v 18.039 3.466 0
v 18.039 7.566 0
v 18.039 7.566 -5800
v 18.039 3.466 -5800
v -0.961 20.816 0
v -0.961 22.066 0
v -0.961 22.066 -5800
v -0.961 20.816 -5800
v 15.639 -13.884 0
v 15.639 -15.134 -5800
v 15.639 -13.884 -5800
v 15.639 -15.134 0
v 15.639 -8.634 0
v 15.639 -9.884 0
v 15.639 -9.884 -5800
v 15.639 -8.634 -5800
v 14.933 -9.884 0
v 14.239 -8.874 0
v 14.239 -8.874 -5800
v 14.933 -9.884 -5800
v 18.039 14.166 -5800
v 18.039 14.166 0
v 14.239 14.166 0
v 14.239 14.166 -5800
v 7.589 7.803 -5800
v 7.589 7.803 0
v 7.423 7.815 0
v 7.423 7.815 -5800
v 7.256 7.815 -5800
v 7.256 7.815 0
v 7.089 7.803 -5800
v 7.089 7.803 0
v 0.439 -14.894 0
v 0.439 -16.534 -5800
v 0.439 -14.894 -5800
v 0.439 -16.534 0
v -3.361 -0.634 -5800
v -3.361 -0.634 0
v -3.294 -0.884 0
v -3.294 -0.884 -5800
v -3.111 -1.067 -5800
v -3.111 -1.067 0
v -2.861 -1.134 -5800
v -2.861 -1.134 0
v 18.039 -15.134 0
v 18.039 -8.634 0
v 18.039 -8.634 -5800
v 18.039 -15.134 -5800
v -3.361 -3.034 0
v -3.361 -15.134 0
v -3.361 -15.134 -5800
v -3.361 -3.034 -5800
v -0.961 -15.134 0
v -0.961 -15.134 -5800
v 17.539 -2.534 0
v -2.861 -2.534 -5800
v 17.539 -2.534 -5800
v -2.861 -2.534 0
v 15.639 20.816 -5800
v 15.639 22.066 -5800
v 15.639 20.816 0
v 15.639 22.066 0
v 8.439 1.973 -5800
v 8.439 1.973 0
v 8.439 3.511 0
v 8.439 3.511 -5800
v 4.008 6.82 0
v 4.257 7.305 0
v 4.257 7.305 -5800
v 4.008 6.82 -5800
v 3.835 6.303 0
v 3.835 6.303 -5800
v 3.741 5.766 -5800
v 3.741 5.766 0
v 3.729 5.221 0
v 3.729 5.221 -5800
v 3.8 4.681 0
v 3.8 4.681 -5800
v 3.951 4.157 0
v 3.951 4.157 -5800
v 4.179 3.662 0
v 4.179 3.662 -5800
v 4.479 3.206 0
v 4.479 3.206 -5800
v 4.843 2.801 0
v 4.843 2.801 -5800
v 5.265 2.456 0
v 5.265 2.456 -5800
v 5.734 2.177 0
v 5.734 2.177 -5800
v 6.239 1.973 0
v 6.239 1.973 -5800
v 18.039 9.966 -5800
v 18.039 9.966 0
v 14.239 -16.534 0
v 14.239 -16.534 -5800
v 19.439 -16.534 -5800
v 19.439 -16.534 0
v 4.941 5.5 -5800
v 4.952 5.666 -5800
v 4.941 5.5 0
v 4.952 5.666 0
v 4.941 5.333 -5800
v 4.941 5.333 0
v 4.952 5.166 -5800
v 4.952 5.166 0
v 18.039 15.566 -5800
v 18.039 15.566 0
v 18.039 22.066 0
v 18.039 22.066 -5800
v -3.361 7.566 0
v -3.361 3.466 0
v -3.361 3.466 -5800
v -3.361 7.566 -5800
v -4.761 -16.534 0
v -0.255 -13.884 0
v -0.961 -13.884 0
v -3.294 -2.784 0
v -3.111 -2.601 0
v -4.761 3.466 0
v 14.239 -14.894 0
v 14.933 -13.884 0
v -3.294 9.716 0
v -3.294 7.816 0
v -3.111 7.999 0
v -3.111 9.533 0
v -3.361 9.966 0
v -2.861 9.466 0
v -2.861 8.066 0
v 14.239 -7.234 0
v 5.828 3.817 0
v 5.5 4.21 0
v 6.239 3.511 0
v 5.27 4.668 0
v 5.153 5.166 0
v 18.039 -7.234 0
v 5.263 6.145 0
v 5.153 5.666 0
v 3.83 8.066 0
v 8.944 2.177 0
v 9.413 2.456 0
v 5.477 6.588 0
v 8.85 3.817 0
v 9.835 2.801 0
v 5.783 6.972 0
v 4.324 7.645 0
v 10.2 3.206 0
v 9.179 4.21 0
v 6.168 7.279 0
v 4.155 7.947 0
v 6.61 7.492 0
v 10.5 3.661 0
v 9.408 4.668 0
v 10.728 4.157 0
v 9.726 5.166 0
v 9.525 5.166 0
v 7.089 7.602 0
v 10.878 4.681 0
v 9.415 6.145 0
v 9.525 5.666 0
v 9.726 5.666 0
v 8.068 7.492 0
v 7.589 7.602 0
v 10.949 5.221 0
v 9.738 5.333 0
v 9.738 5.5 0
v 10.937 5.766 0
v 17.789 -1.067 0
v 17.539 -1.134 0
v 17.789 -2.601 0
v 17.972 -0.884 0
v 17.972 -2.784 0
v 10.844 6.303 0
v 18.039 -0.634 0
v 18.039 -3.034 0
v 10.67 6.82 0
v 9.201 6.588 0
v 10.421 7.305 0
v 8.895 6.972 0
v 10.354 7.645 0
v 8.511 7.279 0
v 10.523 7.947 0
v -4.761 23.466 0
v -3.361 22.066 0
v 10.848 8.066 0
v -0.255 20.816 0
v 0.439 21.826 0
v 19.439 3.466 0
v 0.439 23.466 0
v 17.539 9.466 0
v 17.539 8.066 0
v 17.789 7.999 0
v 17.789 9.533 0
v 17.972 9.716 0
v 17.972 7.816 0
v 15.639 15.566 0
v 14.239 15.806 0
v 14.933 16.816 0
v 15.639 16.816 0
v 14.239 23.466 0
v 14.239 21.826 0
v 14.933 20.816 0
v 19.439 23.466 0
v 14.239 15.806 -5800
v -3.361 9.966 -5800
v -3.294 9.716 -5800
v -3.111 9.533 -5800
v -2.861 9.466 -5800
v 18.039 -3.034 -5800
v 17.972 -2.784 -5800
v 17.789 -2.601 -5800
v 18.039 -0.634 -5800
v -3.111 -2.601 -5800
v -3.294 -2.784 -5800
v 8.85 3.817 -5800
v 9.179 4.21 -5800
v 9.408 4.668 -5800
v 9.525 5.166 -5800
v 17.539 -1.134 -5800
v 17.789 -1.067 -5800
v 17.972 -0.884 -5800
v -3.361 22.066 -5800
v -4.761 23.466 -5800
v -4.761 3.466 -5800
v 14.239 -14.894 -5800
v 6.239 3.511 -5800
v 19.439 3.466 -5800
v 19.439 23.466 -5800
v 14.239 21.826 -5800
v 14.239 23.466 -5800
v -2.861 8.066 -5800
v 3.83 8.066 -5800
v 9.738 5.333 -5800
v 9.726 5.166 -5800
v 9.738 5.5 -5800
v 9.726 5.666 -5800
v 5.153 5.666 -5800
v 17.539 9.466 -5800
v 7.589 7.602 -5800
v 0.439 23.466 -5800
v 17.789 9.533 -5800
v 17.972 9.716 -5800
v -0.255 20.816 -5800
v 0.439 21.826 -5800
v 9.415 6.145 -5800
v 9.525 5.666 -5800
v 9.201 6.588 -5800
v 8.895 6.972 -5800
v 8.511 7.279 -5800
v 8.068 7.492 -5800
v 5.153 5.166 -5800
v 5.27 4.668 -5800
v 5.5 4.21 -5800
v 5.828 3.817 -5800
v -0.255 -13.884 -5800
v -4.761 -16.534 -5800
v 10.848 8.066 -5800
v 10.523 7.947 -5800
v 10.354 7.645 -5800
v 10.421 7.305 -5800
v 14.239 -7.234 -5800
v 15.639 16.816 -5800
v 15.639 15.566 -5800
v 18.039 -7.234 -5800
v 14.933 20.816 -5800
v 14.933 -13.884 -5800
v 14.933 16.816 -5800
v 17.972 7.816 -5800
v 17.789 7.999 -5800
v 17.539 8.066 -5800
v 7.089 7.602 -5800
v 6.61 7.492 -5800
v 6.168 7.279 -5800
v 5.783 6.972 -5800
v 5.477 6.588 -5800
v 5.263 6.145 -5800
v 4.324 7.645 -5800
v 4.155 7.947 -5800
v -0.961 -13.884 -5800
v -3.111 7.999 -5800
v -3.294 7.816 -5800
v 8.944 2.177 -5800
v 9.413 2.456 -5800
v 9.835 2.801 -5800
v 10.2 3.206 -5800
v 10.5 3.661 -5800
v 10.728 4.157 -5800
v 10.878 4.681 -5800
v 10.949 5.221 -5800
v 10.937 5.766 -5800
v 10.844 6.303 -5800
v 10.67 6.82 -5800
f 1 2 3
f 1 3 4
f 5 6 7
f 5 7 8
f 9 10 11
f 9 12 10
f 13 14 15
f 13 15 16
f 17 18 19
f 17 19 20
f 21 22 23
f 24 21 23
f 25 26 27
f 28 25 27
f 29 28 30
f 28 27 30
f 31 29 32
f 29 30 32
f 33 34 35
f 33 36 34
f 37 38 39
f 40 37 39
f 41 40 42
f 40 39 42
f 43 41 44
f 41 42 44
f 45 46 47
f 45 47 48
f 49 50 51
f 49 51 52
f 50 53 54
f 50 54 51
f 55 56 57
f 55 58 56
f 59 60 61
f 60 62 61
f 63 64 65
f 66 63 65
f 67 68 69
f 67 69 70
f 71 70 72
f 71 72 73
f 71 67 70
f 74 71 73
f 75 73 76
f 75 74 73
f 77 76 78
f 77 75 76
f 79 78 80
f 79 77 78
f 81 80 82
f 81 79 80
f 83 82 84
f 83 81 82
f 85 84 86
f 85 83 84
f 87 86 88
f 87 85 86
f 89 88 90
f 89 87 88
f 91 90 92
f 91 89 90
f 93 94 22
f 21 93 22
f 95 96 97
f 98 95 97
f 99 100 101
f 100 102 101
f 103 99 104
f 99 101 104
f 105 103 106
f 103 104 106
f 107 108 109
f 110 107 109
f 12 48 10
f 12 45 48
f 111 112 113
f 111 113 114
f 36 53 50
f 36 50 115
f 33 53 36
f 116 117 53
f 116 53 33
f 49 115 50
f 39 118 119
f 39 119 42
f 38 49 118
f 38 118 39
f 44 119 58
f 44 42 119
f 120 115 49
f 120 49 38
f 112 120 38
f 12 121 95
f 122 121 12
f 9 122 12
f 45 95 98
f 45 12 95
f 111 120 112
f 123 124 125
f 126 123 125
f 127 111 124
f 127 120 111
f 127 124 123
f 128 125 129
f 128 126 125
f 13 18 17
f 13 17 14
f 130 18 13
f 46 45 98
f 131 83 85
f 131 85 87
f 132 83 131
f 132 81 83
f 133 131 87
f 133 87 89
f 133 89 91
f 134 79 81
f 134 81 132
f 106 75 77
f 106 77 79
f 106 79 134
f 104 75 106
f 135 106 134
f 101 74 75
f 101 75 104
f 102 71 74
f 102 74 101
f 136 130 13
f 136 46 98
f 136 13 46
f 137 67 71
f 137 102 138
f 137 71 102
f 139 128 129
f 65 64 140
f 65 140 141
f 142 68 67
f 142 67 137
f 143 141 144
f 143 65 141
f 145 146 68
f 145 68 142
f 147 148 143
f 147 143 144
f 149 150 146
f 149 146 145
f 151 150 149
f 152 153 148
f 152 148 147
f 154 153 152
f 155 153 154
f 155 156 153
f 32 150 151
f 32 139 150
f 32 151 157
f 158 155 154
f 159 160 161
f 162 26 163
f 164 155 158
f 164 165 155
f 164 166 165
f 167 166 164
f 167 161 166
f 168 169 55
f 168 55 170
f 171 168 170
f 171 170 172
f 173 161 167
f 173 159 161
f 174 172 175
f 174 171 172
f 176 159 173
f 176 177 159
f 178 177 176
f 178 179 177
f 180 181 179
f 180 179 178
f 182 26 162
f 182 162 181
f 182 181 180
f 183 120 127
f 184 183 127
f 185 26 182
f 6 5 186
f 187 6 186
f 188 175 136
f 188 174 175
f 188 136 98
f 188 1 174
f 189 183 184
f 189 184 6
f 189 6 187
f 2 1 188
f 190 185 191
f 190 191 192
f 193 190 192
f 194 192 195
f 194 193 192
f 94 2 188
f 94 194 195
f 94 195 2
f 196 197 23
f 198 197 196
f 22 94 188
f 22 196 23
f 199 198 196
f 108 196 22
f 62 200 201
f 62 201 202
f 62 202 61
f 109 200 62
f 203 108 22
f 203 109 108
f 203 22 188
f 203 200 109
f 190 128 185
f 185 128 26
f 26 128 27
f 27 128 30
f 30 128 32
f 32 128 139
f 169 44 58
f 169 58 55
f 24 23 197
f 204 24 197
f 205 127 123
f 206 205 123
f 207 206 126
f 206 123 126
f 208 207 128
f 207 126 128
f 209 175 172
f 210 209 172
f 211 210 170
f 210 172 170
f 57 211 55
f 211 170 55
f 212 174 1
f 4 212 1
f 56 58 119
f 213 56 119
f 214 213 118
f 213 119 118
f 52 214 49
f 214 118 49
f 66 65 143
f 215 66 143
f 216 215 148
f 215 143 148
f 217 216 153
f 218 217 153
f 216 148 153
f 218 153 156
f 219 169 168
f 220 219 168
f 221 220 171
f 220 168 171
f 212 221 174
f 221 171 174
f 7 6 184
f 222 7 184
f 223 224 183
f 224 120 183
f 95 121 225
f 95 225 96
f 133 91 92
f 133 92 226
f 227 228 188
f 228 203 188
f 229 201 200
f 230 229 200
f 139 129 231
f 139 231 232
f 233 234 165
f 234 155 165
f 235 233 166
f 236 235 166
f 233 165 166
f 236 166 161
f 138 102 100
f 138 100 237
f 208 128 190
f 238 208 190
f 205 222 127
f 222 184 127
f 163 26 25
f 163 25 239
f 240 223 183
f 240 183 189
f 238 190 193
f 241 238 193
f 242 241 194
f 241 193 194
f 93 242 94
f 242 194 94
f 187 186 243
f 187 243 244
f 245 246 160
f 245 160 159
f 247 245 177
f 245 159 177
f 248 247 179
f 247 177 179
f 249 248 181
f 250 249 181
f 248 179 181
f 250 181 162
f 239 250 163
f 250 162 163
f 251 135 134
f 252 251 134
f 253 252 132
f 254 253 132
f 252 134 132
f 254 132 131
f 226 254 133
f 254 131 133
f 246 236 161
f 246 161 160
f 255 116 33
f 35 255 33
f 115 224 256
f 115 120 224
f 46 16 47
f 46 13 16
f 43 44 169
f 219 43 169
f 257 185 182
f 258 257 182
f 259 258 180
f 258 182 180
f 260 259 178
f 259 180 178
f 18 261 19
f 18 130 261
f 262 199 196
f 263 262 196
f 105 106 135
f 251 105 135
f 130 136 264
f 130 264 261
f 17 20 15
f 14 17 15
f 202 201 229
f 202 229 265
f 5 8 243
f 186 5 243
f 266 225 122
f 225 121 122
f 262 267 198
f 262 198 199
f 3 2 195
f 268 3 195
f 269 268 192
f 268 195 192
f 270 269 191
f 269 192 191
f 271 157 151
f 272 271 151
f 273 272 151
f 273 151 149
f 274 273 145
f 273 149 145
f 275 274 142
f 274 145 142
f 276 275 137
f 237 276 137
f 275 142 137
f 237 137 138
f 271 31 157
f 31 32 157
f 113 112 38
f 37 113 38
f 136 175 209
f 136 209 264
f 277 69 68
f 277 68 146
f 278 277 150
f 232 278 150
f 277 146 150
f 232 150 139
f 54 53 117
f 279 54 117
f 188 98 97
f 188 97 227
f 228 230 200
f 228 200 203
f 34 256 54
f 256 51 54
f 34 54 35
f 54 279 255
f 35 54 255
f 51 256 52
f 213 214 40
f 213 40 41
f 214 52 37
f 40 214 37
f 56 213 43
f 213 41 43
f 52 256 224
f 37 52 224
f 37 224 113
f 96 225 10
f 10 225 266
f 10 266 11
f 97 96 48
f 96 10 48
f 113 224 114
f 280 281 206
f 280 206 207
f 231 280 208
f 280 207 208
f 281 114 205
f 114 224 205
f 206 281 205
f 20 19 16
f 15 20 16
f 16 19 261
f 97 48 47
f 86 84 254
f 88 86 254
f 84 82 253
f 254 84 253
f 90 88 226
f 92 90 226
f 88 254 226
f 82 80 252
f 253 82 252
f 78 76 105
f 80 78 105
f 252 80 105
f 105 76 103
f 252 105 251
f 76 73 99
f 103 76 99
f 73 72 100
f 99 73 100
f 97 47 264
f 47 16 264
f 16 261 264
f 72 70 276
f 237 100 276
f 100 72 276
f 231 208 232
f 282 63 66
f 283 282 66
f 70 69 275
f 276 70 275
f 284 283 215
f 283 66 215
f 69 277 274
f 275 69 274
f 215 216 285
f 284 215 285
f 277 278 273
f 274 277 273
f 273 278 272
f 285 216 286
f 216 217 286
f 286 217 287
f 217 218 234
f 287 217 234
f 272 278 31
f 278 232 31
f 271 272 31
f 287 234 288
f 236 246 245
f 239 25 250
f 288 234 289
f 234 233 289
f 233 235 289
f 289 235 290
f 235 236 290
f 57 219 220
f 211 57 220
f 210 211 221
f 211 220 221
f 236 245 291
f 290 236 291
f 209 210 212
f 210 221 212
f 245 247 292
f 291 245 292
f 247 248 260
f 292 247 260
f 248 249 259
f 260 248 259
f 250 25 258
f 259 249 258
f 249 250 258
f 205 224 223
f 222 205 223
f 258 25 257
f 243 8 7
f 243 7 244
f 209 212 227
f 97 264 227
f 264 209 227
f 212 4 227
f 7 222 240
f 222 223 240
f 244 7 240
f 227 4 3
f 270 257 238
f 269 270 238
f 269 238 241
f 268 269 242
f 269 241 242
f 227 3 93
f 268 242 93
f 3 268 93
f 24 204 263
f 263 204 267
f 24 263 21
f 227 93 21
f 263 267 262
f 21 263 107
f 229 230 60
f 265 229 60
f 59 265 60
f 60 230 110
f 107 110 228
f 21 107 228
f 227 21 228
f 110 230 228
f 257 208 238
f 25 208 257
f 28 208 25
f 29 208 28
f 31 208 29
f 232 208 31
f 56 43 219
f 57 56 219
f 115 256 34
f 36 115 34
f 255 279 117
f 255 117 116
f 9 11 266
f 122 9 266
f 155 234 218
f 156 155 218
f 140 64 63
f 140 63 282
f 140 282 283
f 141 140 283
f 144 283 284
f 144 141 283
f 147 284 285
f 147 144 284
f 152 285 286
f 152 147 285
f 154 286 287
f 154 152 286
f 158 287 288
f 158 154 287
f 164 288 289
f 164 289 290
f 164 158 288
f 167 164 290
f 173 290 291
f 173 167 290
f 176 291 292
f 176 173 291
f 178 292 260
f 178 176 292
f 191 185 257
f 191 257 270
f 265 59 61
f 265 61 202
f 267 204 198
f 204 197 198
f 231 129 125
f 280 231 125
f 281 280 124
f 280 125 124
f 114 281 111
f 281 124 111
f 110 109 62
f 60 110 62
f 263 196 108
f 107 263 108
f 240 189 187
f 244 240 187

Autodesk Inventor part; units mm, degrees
ref_plane "YZ Plane" through (0, 0, 0) normal (1, 0, 0) x (0, 1, 0)
ref_plane "XZ Plane" through (0, 0, 0) normal (0, 1, 0) x (-1, 0, 0)
ref_plane "XY Plane" through (0, 0, 0) normal (0, 0, 1) x (1, 0, 0)
sketch "Boceto1" plane through (0, 0, 0) normal (0, 0, 1) x (1, 0, 0)
  line L0 (-4.7609, 3.4664) -> (-4.7609, -16.5336)
  line L1 (-4.7609, -16.5336) -> (0.4391, -16.5336)
  line L2 (0.4391, -16.5336) -> (0.4391, -14.8936)
  line L3 (-0.9609, -15.1336) -> (-3.3609, -15.1336)
  line L4 (-3.3609, -15.1336) -> (-3.3609, -3.0336)
  line L5 (-2.8609, -2.5336) -> (17.5391, -2.5336)
  line L6 (18.0391, -3.0336) -> (18.0391, -7.2336)
  line L7 (18.0391, -7.2336) -> (14.2391, -7.2336)
  line L8 (14.2391, -7.2336) -> (14.2391, -8.8736)
  line L9 (14.9333, -9.8836) -> (15.6391, -9.8836)
  line L10 (15.6391, -9.8836) -> (15.6391, -8.6336)
  line L11 (15.6391, -8.6336) -> (18.0391, -8.6336)
  line L12 (18.0391, -8.6336) -> (18.0391, -15.1336)
  line L13 (18.0391, -15.1336) -> (15.6391, -15.1336)
  line L14 (15.6391, -15.1336) -> (15.6391, -13.8836)
  line L15 (15.6391, -13.8836) -> (14.9333, -13.8836)
  line L16 (14.2391, -14.8936) -> (14.2391, -16.5336)
  line L17 (14.2391, -16.5336) -> (19.4391, -16.5336)
  line L18 (19.4391, -16.5336) -> (19.4391, 3.4664)
  line L19 (-3.3609, 3.4664) -> (-3.3609, -0.6336)
  line L20 (18.0391, -0.6336) -> (18.0391, 3.4664)
  line L21 (7.3391, 9.4664) -> (7.3391, -1.1336) construction
  line L22 (-2.8609, -1.1336) -> (17.5391, -1.1336)
  line L23 (-0.9609, -15.1336) -> (-0.9609, -13.8836)
  line L24 (-0.9609, -13.8836) -> (-0.2551, -13.8836)
  line L25 (-0.2551, -13.8836) -> (0.4391, -14.8936)
  line L26 (14.2391, -8.8736) -> (14.9333, -9.8836)
  line L27 (14.2391, -14.8936) -> (14.9333, -13.8836)
  arc A0 (-2.8609, -2.5336) -> (-3.3609, -3.0336) centre (-2.8609, -3.0336) ccw
  arc A1 (-3.3609, -0.6336) -> (-2.8609, -1.1336) centre (-2.8609, -0.6336) ccw
  arc A2 (17.5391, -1.1336) -> (18.0391, -0.6336) centre (17.5391, -0.6336) ccw
  arc A3 (18.0391, -3.0336) -> (17.5391, -2.5336) centre (17.5391, -3.0336) ccw
  line L28 (-4.7609, 3.4664) -> (-4.7609, 23.4664)
  line L29 (-4.7609, 23.4664) -> (0.4391, 23.4664)
  line L30 (0.4391, 23.4664) -> (0.4391, 21.8264)
  line L31 (-0.9609, 22.0664) -> (-3.3609, 22.0664)
  line L32 (-3.3609, 22.0664) -> (-3.3609, 9.9664)
  line L33 (-2.8609, 9.4664) -> (17.5391, 9.4664)
  line L34 (18.0391, 9.9664) -> (18.0391, 14.1664)
  line L35 (18.0391, 14.1664) -> (14.2391, 14.1664)
  line L36 (14.2391, 14.1664) -> (14.2391, 15.8064)
  line L37 (14.9333, 16.8164) -> (15.6391, 16.8164)
  line L38 (15.6391, 16.8164) -> (15.6391, 15.5664)
  line L39 (15.6391, 15.5664) -> (18.0391, 15.5664)
  line L40 (18.0391, 15.5664) -> (18.0391, 22.0664)
  line L41 (18.0391, 22.0664) -> (15.6391, 22.0664)
  line L42 (15.6391, 22.0664) -> (15.6391, 20.8164)
  line L43 (15.6391, 20.8164) -> (14.9333, 20.8164)
  line L44 (14.2391, 21.8264) -> (14.2391, 23.4664)
  line L45 (14.2391, 23.4664) -> (19.4391, 23.4664)
  line L46 (19.4391, 23.4664) -> (19.4391, 3.4664)
  line L47 (-3.3609, 3.4664) -> (-3.3609, 7.5664)
  line L48 (18.0391, 7.5664) -> (18.0391, 3.4664)
  line L49 (7.3391, -1.1336) -> (7.3391, 9.4664) construction
  arc A4 (8.4391, 3.5111) -> (6.2391, 3.5111) centre (7.3391, 5.4164) ccw
  line L50 (4.9522, 5.6664) -> (5.1534, 5.6664)
  line L51 (4.9522, 5.1664) -> (5.1534, 5.1664)
  line L52 (-2.8609, 8.0664) -> (3.8304, 8.0664)
  line L53 (10.8478, 8.0664) -> (17.5391, 8.0664)
  line L54 (4.0797, 5.4164) -> (9.7739, 5.4164) construction
  line L55 (9.726, 5.6664) -> (9.5249, 5.6664)
  line L56 (9.726, 5.1664) -> (9.5249, 5.1664)
  line L57 (7.5891, 7.8033) -> (7.5891, 7.6021)
  line L58 (7.0891, 7.8033) -> (7.0891, 7.6021)
  arc A5 (7.5891, 7.8033) -> (7.0891, 7.8033) centre (7.3391, 5.4164) ccw
  arc A6 (9.726, 5.1664) -> (9.726, 5.6664) centre (7.3391, 5.4164) ccw
  arc A7 (4.9522, 5.6664) -> (4.9522, 5.1664) centre (7.3391, 5.4164) ccw
  circle A8 centre (7.3391, 5.4164) radius 2.4 construction
  line L59 (6.2391, 1.9728) -> (6.2391, 3.5111)
  line L60 (8.4391, 1.9728) -> (8.4391, 3.5111)
  arc A9 (8.4391, 1.9728) -> (10.4214, 7.3051) centre (7.3391, 5.4164) ccw
  arc A10 (4.2568, 7.3051) -> (6.2391, 1.9728) centre (7.3391, 5.4164) ccw
  line L61 (-0.9609, 22.0664) -> (-0.9609, 20.8164)
  line L62 (-0.9609, 20.8164) -> (-0.2551, 20.8164)
  line L63 (-0.2551, 20.8164) -> (0.4391, 21.8264)
  line L64 (14.2391, 15.8064) -> (14.9333, 16.8164)
  line L65 (14.2391, 21.8264) -> (14.9333, 20.8164)
  arc A11 (-3.3609, 9.9664) -> (-2.8609, 9.4664) centre (-2.8609, 9.9664) ccw
  arc A12 (-2.8609, 8.0664) -> (-3.3609, 7.5664) centre (-2.8609, 7.5664) ccw
  arc A13 (18.0391, 7.5664) -> (17.5391, 8.0664) centre (17.5391, 7.5664) ccw
  arc A14 (17.5391, 9.4664) -> (18.0391, 9.9664) centre (17.5391, 9.9664) ccw
  arc A15 (4.2568, 7.3051) -> (3.8304, 8.0664) centre (3.8304, 7.5664) ccw
  arc A16 (10.8478, 8.0664) -> (10.4214, 7.3051) centre (10.8478, 7.5664) ccw
  point P0 (18.0391, -11.8836)
  point P1 (4.8803, 8.0664)
  point P2 (9.7979, 8.0664)
  point P3 (18.0391, 18.8164)
  dimension "d0" = 1.4
  dimension "d1" = 1.4
  dimension "d2" = 1.4
  dimension "d3" = 1.4
  dimension "d4" = 1.4
  dimension "d5" = 1.4
  dimension "d6" = 1.4
  dimension "d7" = 1.4
  dimension "d8" = 1.4
  dimension "d9" = 1.4
  dimension "d43" = 14
  dimension "d44" = 4
  dimension "d45" = 9.3
  dimension "d46" = 6.5
  dimension "d47" = 24.2
  dimension "d48" = 5.2
  dimension "d49" = 1.4
  dimension "d50" = 5.2
  dimension "d51" = 13.8
  dimension "d52" = 21.4
  dimension "d63" = 2.65
  dimension "d64" = 1.64
  dimension "d65" = 34.5
  dimension "d66" = 2
  dimension "d67" = 2
  dimension "d68" = 2.4
  dimension "d69" = 3.01
  dimension "d70" = 6.02
  dimension "d71" = 34.5
  dimension "d72" = 111
  dimension "d74" = 0.7058
  dimension "d75" = 0.7058
  dimension "d86" = 0.5
  dimension "d87" = 0.5
  dimension "d88" = 40
  dimension "d89" = 1.4
  dimension "d90" = 9.2
  dimension "d91" = 26
  dimension "d92" = 4.05
  dimension "d93" = 3.615
  dimension "d94" = 3.615
  dimension "d95" = 2.4
  dimension "d96" = 2.4
  dimension "d97" = 2.4
  dimension "d98" = 4.8
  dimension "d99" = 2.2
  dimension "d100" = 90
  dimension "d101" = 90
  dimension "d102" = 90
  dimension "d103" = 90
  dimension "d104" = 90
  dimension "d105" = 90
  dimension "d106" = 90
  dimension "d107" = 90
  dimension "d108" = 90
  dimension "d109" = 90
  dimension "d110" = 3.8
  dimension "d111" = 5.2
  dimension "d112" = 11
  dimension "d113" = 11.85
  dimension "d114" = 12.1
  dimension "d115" = 12.35
  dimension "d116" = 13.2
  dimension "d117" = 19
extrude "Extrusión1" add sketch "Boceto1" against normal blind 5800
properties part number "SP40-04B TRAVESAÑO CENTRAL" material "Aluminio"
